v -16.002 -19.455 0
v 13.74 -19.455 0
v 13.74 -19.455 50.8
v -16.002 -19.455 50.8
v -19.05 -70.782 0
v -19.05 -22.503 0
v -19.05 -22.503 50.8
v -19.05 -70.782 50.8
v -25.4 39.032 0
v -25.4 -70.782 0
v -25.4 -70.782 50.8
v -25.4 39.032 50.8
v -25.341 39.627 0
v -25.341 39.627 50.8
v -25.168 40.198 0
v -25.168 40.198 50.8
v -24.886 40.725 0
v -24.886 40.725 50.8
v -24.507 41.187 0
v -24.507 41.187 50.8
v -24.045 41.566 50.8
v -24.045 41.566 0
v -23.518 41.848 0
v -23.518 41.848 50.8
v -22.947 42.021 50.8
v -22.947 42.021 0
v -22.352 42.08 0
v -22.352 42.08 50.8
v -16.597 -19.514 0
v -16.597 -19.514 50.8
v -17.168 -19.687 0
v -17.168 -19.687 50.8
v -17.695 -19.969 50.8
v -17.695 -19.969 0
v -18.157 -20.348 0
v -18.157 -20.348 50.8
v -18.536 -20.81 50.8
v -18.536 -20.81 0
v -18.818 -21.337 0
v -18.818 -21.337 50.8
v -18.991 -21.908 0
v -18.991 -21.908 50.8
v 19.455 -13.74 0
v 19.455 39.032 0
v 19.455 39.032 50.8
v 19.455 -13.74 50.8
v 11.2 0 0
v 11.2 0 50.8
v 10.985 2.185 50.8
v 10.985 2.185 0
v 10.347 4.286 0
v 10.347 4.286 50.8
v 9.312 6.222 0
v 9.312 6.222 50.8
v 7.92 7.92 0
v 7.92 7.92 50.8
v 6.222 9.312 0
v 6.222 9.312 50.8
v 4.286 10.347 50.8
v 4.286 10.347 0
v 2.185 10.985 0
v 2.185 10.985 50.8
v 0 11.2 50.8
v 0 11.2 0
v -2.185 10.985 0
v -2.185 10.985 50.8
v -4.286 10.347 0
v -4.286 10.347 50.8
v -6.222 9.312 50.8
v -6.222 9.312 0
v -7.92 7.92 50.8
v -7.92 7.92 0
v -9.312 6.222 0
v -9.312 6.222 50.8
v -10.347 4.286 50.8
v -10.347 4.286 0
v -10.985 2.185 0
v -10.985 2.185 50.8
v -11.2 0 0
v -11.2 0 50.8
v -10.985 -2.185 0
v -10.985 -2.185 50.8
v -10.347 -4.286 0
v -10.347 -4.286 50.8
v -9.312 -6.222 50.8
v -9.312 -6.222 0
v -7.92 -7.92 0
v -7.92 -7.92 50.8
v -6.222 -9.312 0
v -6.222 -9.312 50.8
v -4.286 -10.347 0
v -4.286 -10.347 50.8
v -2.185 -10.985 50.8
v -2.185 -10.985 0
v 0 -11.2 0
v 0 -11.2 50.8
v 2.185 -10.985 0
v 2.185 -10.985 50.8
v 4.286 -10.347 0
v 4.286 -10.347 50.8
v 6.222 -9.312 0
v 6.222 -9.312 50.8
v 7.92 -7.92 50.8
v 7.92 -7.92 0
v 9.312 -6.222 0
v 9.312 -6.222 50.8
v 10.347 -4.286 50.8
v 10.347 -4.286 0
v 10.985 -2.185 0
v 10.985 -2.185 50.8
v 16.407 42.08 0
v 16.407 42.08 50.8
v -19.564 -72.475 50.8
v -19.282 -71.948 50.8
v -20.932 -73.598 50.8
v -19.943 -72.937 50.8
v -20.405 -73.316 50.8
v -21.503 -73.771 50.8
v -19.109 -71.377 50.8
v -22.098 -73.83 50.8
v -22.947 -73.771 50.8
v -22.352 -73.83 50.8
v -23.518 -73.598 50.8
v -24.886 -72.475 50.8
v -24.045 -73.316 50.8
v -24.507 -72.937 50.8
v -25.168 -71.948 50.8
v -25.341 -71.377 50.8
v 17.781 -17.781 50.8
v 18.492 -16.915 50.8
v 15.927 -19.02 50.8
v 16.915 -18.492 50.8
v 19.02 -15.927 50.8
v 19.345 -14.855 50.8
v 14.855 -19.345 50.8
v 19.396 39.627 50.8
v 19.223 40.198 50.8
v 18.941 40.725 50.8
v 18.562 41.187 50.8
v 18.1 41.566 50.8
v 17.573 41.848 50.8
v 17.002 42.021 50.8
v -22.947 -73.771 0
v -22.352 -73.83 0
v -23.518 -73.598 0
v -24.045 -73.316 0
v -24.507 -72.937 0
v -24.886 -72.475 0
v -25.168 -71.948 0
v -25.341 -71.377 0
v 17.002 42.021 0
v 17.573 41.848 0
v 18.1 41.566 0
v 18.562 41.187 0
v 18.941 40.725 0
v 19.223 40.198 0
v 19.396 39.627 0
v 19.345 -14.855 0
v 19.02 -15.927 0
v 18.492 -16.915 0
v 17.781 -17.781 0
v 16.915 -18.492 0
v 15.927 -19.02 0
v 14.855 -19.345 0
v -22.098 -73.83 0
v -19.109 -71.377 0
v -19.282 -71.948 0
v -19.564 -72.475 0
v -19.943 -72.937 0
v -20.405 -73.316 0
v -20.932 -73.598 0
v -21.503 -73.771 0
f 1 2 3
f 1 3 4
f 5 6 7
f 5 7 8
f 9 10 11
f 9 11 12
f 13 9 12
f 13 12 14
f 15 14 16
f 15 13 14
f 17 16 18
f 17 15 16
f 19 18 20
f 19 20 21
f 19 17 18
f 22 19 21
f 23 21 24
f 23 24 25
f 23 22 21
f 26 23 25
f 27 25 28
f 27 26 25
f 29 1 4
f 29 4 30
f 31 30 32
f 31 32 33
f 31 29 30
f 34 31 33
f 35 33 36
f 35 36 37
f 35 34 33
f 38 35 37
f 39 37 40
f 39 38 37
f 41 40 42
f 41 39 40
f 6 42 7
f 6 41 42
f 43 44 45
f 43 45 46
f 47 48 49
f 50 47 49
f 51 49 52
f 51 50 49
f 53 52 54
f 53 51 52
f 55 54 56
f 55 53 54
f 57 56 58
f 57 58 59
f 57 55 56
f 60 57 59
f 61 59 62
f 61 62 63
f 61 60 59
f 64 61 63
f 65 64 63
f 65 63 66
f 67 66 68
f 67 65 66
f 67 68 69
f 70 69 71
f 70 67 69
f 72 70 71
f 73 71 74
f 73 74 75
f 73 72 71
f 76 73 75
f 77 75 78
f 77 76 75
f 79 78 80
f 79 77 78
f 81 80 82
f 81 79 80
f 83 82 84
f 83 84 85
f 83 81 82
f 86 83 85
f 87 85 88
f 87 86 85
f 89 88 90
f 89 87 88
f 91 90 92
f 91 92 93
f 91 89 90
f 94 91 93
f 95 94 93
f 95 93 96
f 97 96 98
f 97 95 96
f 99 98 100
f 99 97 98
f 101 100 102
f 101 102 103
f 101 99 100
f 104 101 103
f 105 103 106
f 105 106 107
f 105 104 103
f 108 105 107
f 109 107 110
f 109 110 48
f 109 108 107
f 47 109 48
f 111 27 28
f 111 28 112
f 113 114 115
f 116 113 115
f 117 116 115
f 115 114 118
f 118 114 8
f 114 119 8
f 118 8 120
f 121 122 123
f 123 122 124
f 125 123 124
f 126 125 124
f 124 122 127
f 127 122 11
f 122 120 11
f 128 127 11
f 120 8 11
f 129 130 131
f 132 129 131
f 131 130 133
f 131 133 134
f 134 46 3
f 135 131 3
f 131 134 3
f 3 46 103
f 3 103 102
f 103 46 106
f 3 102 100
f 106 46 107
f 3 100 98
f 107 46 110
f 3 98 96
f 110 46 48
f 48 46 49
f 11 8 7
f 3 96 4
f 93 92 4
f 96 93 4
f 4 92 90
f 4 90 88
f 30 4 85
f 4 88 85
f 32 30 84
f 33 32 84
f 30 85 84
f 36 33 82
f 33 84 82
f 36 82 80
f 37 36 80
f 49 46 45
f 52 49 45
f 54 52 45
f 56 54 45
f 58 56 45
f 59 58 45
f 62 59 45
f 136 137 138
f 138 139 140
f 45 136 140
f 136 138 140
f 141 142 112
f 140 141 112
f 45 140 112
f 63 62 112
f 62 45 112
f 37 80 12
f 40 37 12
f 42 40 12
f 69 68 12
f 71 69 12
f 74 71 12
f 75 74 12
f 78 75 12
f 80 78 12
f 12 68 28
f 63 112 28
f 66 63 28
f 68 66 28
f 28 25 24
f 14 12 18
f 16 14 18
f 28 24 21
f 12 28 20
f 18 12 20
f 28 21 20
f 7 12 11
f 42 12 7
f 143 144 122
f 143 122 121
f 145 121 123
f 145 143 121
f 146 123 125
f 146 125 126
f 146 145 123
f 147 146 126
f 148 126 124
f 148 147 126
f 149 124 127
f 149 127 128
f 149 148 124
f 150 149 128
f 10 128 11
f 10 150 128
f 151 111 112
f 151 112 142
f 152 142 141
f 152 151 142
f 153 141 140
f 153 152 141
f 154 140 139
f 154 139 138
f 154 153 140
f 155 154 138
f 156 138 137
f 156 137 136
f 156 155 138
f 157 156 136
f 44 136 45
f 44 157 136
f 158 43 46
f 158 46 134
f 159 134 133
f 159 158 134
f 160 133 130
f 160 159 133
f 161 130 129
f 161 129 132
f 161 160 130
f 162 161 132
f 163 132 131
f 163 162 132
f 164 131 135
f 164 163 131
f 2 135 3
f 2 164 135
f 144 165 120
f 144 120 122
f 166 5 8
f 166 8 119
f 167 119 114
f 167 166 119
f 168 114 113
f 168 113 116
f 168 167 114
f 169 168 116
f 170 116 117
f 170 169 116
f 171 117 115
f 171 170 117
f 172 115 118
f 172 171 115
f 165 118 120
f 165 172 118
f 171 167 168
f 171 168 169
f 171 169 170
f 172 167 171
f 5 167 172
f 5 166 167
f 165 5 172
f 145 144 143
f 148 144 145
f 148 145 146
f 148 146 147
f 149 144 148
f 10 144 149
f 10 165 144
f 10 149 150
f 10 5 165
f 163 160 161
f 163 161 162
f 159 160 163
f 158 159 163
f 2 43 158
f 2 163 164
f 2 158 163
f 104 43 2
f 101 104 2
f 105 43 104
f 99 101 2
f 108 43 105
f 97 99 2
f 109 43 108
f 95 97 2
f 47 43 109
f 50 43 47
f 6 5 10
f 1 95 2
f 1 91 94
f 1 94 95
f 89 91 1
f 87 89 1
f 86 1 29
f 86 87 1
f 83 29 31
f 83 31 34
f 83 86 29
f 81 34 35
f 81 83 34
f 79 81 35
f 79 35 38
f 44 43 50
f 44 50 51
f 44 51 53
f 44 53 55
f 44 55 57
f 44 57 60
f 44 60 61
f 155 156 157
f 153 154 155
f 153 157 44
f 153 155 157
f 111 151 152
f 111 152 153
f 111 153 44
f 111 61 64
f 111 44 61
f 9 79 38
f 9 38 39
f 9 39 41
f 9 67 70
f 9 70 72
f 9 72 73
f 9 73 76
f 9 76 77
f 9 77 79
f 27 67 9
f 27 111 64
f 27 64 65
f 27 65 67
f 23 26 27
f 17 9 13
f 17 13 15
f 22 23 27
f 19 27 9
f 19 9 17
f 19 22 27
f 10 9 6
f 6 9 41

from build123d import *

# Parameters (mm, degrees)
SKETCH1_R           = 11.2
BOSS_EXTRUDE1_DEPTH = 50.8


with BuildPart() as part:
    # Sketch1 → Boss-Extrude1 (new body)
    with BuildSketch(Plane.XY):
        with BuildLine():
            Line((-25.4, -19.455), (-25.4, 19.455))
            Line((-25.4, 19.455), (-25.4, 39.031999962))
            ThreePointArc((-25.4, 39.031999962), (-24.507261469, 41.187261431), (-22.352, 42.079999962))
            Line((-22.352, 42.079999962), (16.407, 42.079999962))
            ThreePointArc((16.407, 42.079999962), (18.562261469, 41.187261431), (19.455, 39.031999962))
            Line((19.455, 39.031999962), (19.455, 19.455))
            Line((19.455, 19.455), (19.455, 0))
            Line((19.455, 0), (19.455, -13.74))
            ThreePointArc((19.455, -13.74), (17.781115254, -17.781115254), (13.74, -19.455))
            Line((13.74, -19.455), (0, -19.455))
            Line((0, -19.455), (-16.002, -19.455))
            ThreePointArc((-16.002, -19.455), (-18.157261469, -20.347738531), (-19.05, -22.503))
            Line((-19.05, -22.503), (-19.05, -70.781999962))
            ThreePointArc((-19.05, -70.781999962), (-19.942738531, -72.937261431), (-22.098, -73.829999962))
            Line((-22.098, -73.829999962), (-22.352, -73.829999962))
            ThreePointArc((-22.352, -73.829999962), (-24.507261469, -72.937261431), (-25.4, -70.781999962))
            Line((-25.4, -70.781999962), (-25.4, -19.455))
        make_face()
        Circle(SKETCH1_R, mode=Mode.SUBTRACT)
    extrude(amount=BOSS_EXTRUDE1_DEPTH)


solid = part.part
